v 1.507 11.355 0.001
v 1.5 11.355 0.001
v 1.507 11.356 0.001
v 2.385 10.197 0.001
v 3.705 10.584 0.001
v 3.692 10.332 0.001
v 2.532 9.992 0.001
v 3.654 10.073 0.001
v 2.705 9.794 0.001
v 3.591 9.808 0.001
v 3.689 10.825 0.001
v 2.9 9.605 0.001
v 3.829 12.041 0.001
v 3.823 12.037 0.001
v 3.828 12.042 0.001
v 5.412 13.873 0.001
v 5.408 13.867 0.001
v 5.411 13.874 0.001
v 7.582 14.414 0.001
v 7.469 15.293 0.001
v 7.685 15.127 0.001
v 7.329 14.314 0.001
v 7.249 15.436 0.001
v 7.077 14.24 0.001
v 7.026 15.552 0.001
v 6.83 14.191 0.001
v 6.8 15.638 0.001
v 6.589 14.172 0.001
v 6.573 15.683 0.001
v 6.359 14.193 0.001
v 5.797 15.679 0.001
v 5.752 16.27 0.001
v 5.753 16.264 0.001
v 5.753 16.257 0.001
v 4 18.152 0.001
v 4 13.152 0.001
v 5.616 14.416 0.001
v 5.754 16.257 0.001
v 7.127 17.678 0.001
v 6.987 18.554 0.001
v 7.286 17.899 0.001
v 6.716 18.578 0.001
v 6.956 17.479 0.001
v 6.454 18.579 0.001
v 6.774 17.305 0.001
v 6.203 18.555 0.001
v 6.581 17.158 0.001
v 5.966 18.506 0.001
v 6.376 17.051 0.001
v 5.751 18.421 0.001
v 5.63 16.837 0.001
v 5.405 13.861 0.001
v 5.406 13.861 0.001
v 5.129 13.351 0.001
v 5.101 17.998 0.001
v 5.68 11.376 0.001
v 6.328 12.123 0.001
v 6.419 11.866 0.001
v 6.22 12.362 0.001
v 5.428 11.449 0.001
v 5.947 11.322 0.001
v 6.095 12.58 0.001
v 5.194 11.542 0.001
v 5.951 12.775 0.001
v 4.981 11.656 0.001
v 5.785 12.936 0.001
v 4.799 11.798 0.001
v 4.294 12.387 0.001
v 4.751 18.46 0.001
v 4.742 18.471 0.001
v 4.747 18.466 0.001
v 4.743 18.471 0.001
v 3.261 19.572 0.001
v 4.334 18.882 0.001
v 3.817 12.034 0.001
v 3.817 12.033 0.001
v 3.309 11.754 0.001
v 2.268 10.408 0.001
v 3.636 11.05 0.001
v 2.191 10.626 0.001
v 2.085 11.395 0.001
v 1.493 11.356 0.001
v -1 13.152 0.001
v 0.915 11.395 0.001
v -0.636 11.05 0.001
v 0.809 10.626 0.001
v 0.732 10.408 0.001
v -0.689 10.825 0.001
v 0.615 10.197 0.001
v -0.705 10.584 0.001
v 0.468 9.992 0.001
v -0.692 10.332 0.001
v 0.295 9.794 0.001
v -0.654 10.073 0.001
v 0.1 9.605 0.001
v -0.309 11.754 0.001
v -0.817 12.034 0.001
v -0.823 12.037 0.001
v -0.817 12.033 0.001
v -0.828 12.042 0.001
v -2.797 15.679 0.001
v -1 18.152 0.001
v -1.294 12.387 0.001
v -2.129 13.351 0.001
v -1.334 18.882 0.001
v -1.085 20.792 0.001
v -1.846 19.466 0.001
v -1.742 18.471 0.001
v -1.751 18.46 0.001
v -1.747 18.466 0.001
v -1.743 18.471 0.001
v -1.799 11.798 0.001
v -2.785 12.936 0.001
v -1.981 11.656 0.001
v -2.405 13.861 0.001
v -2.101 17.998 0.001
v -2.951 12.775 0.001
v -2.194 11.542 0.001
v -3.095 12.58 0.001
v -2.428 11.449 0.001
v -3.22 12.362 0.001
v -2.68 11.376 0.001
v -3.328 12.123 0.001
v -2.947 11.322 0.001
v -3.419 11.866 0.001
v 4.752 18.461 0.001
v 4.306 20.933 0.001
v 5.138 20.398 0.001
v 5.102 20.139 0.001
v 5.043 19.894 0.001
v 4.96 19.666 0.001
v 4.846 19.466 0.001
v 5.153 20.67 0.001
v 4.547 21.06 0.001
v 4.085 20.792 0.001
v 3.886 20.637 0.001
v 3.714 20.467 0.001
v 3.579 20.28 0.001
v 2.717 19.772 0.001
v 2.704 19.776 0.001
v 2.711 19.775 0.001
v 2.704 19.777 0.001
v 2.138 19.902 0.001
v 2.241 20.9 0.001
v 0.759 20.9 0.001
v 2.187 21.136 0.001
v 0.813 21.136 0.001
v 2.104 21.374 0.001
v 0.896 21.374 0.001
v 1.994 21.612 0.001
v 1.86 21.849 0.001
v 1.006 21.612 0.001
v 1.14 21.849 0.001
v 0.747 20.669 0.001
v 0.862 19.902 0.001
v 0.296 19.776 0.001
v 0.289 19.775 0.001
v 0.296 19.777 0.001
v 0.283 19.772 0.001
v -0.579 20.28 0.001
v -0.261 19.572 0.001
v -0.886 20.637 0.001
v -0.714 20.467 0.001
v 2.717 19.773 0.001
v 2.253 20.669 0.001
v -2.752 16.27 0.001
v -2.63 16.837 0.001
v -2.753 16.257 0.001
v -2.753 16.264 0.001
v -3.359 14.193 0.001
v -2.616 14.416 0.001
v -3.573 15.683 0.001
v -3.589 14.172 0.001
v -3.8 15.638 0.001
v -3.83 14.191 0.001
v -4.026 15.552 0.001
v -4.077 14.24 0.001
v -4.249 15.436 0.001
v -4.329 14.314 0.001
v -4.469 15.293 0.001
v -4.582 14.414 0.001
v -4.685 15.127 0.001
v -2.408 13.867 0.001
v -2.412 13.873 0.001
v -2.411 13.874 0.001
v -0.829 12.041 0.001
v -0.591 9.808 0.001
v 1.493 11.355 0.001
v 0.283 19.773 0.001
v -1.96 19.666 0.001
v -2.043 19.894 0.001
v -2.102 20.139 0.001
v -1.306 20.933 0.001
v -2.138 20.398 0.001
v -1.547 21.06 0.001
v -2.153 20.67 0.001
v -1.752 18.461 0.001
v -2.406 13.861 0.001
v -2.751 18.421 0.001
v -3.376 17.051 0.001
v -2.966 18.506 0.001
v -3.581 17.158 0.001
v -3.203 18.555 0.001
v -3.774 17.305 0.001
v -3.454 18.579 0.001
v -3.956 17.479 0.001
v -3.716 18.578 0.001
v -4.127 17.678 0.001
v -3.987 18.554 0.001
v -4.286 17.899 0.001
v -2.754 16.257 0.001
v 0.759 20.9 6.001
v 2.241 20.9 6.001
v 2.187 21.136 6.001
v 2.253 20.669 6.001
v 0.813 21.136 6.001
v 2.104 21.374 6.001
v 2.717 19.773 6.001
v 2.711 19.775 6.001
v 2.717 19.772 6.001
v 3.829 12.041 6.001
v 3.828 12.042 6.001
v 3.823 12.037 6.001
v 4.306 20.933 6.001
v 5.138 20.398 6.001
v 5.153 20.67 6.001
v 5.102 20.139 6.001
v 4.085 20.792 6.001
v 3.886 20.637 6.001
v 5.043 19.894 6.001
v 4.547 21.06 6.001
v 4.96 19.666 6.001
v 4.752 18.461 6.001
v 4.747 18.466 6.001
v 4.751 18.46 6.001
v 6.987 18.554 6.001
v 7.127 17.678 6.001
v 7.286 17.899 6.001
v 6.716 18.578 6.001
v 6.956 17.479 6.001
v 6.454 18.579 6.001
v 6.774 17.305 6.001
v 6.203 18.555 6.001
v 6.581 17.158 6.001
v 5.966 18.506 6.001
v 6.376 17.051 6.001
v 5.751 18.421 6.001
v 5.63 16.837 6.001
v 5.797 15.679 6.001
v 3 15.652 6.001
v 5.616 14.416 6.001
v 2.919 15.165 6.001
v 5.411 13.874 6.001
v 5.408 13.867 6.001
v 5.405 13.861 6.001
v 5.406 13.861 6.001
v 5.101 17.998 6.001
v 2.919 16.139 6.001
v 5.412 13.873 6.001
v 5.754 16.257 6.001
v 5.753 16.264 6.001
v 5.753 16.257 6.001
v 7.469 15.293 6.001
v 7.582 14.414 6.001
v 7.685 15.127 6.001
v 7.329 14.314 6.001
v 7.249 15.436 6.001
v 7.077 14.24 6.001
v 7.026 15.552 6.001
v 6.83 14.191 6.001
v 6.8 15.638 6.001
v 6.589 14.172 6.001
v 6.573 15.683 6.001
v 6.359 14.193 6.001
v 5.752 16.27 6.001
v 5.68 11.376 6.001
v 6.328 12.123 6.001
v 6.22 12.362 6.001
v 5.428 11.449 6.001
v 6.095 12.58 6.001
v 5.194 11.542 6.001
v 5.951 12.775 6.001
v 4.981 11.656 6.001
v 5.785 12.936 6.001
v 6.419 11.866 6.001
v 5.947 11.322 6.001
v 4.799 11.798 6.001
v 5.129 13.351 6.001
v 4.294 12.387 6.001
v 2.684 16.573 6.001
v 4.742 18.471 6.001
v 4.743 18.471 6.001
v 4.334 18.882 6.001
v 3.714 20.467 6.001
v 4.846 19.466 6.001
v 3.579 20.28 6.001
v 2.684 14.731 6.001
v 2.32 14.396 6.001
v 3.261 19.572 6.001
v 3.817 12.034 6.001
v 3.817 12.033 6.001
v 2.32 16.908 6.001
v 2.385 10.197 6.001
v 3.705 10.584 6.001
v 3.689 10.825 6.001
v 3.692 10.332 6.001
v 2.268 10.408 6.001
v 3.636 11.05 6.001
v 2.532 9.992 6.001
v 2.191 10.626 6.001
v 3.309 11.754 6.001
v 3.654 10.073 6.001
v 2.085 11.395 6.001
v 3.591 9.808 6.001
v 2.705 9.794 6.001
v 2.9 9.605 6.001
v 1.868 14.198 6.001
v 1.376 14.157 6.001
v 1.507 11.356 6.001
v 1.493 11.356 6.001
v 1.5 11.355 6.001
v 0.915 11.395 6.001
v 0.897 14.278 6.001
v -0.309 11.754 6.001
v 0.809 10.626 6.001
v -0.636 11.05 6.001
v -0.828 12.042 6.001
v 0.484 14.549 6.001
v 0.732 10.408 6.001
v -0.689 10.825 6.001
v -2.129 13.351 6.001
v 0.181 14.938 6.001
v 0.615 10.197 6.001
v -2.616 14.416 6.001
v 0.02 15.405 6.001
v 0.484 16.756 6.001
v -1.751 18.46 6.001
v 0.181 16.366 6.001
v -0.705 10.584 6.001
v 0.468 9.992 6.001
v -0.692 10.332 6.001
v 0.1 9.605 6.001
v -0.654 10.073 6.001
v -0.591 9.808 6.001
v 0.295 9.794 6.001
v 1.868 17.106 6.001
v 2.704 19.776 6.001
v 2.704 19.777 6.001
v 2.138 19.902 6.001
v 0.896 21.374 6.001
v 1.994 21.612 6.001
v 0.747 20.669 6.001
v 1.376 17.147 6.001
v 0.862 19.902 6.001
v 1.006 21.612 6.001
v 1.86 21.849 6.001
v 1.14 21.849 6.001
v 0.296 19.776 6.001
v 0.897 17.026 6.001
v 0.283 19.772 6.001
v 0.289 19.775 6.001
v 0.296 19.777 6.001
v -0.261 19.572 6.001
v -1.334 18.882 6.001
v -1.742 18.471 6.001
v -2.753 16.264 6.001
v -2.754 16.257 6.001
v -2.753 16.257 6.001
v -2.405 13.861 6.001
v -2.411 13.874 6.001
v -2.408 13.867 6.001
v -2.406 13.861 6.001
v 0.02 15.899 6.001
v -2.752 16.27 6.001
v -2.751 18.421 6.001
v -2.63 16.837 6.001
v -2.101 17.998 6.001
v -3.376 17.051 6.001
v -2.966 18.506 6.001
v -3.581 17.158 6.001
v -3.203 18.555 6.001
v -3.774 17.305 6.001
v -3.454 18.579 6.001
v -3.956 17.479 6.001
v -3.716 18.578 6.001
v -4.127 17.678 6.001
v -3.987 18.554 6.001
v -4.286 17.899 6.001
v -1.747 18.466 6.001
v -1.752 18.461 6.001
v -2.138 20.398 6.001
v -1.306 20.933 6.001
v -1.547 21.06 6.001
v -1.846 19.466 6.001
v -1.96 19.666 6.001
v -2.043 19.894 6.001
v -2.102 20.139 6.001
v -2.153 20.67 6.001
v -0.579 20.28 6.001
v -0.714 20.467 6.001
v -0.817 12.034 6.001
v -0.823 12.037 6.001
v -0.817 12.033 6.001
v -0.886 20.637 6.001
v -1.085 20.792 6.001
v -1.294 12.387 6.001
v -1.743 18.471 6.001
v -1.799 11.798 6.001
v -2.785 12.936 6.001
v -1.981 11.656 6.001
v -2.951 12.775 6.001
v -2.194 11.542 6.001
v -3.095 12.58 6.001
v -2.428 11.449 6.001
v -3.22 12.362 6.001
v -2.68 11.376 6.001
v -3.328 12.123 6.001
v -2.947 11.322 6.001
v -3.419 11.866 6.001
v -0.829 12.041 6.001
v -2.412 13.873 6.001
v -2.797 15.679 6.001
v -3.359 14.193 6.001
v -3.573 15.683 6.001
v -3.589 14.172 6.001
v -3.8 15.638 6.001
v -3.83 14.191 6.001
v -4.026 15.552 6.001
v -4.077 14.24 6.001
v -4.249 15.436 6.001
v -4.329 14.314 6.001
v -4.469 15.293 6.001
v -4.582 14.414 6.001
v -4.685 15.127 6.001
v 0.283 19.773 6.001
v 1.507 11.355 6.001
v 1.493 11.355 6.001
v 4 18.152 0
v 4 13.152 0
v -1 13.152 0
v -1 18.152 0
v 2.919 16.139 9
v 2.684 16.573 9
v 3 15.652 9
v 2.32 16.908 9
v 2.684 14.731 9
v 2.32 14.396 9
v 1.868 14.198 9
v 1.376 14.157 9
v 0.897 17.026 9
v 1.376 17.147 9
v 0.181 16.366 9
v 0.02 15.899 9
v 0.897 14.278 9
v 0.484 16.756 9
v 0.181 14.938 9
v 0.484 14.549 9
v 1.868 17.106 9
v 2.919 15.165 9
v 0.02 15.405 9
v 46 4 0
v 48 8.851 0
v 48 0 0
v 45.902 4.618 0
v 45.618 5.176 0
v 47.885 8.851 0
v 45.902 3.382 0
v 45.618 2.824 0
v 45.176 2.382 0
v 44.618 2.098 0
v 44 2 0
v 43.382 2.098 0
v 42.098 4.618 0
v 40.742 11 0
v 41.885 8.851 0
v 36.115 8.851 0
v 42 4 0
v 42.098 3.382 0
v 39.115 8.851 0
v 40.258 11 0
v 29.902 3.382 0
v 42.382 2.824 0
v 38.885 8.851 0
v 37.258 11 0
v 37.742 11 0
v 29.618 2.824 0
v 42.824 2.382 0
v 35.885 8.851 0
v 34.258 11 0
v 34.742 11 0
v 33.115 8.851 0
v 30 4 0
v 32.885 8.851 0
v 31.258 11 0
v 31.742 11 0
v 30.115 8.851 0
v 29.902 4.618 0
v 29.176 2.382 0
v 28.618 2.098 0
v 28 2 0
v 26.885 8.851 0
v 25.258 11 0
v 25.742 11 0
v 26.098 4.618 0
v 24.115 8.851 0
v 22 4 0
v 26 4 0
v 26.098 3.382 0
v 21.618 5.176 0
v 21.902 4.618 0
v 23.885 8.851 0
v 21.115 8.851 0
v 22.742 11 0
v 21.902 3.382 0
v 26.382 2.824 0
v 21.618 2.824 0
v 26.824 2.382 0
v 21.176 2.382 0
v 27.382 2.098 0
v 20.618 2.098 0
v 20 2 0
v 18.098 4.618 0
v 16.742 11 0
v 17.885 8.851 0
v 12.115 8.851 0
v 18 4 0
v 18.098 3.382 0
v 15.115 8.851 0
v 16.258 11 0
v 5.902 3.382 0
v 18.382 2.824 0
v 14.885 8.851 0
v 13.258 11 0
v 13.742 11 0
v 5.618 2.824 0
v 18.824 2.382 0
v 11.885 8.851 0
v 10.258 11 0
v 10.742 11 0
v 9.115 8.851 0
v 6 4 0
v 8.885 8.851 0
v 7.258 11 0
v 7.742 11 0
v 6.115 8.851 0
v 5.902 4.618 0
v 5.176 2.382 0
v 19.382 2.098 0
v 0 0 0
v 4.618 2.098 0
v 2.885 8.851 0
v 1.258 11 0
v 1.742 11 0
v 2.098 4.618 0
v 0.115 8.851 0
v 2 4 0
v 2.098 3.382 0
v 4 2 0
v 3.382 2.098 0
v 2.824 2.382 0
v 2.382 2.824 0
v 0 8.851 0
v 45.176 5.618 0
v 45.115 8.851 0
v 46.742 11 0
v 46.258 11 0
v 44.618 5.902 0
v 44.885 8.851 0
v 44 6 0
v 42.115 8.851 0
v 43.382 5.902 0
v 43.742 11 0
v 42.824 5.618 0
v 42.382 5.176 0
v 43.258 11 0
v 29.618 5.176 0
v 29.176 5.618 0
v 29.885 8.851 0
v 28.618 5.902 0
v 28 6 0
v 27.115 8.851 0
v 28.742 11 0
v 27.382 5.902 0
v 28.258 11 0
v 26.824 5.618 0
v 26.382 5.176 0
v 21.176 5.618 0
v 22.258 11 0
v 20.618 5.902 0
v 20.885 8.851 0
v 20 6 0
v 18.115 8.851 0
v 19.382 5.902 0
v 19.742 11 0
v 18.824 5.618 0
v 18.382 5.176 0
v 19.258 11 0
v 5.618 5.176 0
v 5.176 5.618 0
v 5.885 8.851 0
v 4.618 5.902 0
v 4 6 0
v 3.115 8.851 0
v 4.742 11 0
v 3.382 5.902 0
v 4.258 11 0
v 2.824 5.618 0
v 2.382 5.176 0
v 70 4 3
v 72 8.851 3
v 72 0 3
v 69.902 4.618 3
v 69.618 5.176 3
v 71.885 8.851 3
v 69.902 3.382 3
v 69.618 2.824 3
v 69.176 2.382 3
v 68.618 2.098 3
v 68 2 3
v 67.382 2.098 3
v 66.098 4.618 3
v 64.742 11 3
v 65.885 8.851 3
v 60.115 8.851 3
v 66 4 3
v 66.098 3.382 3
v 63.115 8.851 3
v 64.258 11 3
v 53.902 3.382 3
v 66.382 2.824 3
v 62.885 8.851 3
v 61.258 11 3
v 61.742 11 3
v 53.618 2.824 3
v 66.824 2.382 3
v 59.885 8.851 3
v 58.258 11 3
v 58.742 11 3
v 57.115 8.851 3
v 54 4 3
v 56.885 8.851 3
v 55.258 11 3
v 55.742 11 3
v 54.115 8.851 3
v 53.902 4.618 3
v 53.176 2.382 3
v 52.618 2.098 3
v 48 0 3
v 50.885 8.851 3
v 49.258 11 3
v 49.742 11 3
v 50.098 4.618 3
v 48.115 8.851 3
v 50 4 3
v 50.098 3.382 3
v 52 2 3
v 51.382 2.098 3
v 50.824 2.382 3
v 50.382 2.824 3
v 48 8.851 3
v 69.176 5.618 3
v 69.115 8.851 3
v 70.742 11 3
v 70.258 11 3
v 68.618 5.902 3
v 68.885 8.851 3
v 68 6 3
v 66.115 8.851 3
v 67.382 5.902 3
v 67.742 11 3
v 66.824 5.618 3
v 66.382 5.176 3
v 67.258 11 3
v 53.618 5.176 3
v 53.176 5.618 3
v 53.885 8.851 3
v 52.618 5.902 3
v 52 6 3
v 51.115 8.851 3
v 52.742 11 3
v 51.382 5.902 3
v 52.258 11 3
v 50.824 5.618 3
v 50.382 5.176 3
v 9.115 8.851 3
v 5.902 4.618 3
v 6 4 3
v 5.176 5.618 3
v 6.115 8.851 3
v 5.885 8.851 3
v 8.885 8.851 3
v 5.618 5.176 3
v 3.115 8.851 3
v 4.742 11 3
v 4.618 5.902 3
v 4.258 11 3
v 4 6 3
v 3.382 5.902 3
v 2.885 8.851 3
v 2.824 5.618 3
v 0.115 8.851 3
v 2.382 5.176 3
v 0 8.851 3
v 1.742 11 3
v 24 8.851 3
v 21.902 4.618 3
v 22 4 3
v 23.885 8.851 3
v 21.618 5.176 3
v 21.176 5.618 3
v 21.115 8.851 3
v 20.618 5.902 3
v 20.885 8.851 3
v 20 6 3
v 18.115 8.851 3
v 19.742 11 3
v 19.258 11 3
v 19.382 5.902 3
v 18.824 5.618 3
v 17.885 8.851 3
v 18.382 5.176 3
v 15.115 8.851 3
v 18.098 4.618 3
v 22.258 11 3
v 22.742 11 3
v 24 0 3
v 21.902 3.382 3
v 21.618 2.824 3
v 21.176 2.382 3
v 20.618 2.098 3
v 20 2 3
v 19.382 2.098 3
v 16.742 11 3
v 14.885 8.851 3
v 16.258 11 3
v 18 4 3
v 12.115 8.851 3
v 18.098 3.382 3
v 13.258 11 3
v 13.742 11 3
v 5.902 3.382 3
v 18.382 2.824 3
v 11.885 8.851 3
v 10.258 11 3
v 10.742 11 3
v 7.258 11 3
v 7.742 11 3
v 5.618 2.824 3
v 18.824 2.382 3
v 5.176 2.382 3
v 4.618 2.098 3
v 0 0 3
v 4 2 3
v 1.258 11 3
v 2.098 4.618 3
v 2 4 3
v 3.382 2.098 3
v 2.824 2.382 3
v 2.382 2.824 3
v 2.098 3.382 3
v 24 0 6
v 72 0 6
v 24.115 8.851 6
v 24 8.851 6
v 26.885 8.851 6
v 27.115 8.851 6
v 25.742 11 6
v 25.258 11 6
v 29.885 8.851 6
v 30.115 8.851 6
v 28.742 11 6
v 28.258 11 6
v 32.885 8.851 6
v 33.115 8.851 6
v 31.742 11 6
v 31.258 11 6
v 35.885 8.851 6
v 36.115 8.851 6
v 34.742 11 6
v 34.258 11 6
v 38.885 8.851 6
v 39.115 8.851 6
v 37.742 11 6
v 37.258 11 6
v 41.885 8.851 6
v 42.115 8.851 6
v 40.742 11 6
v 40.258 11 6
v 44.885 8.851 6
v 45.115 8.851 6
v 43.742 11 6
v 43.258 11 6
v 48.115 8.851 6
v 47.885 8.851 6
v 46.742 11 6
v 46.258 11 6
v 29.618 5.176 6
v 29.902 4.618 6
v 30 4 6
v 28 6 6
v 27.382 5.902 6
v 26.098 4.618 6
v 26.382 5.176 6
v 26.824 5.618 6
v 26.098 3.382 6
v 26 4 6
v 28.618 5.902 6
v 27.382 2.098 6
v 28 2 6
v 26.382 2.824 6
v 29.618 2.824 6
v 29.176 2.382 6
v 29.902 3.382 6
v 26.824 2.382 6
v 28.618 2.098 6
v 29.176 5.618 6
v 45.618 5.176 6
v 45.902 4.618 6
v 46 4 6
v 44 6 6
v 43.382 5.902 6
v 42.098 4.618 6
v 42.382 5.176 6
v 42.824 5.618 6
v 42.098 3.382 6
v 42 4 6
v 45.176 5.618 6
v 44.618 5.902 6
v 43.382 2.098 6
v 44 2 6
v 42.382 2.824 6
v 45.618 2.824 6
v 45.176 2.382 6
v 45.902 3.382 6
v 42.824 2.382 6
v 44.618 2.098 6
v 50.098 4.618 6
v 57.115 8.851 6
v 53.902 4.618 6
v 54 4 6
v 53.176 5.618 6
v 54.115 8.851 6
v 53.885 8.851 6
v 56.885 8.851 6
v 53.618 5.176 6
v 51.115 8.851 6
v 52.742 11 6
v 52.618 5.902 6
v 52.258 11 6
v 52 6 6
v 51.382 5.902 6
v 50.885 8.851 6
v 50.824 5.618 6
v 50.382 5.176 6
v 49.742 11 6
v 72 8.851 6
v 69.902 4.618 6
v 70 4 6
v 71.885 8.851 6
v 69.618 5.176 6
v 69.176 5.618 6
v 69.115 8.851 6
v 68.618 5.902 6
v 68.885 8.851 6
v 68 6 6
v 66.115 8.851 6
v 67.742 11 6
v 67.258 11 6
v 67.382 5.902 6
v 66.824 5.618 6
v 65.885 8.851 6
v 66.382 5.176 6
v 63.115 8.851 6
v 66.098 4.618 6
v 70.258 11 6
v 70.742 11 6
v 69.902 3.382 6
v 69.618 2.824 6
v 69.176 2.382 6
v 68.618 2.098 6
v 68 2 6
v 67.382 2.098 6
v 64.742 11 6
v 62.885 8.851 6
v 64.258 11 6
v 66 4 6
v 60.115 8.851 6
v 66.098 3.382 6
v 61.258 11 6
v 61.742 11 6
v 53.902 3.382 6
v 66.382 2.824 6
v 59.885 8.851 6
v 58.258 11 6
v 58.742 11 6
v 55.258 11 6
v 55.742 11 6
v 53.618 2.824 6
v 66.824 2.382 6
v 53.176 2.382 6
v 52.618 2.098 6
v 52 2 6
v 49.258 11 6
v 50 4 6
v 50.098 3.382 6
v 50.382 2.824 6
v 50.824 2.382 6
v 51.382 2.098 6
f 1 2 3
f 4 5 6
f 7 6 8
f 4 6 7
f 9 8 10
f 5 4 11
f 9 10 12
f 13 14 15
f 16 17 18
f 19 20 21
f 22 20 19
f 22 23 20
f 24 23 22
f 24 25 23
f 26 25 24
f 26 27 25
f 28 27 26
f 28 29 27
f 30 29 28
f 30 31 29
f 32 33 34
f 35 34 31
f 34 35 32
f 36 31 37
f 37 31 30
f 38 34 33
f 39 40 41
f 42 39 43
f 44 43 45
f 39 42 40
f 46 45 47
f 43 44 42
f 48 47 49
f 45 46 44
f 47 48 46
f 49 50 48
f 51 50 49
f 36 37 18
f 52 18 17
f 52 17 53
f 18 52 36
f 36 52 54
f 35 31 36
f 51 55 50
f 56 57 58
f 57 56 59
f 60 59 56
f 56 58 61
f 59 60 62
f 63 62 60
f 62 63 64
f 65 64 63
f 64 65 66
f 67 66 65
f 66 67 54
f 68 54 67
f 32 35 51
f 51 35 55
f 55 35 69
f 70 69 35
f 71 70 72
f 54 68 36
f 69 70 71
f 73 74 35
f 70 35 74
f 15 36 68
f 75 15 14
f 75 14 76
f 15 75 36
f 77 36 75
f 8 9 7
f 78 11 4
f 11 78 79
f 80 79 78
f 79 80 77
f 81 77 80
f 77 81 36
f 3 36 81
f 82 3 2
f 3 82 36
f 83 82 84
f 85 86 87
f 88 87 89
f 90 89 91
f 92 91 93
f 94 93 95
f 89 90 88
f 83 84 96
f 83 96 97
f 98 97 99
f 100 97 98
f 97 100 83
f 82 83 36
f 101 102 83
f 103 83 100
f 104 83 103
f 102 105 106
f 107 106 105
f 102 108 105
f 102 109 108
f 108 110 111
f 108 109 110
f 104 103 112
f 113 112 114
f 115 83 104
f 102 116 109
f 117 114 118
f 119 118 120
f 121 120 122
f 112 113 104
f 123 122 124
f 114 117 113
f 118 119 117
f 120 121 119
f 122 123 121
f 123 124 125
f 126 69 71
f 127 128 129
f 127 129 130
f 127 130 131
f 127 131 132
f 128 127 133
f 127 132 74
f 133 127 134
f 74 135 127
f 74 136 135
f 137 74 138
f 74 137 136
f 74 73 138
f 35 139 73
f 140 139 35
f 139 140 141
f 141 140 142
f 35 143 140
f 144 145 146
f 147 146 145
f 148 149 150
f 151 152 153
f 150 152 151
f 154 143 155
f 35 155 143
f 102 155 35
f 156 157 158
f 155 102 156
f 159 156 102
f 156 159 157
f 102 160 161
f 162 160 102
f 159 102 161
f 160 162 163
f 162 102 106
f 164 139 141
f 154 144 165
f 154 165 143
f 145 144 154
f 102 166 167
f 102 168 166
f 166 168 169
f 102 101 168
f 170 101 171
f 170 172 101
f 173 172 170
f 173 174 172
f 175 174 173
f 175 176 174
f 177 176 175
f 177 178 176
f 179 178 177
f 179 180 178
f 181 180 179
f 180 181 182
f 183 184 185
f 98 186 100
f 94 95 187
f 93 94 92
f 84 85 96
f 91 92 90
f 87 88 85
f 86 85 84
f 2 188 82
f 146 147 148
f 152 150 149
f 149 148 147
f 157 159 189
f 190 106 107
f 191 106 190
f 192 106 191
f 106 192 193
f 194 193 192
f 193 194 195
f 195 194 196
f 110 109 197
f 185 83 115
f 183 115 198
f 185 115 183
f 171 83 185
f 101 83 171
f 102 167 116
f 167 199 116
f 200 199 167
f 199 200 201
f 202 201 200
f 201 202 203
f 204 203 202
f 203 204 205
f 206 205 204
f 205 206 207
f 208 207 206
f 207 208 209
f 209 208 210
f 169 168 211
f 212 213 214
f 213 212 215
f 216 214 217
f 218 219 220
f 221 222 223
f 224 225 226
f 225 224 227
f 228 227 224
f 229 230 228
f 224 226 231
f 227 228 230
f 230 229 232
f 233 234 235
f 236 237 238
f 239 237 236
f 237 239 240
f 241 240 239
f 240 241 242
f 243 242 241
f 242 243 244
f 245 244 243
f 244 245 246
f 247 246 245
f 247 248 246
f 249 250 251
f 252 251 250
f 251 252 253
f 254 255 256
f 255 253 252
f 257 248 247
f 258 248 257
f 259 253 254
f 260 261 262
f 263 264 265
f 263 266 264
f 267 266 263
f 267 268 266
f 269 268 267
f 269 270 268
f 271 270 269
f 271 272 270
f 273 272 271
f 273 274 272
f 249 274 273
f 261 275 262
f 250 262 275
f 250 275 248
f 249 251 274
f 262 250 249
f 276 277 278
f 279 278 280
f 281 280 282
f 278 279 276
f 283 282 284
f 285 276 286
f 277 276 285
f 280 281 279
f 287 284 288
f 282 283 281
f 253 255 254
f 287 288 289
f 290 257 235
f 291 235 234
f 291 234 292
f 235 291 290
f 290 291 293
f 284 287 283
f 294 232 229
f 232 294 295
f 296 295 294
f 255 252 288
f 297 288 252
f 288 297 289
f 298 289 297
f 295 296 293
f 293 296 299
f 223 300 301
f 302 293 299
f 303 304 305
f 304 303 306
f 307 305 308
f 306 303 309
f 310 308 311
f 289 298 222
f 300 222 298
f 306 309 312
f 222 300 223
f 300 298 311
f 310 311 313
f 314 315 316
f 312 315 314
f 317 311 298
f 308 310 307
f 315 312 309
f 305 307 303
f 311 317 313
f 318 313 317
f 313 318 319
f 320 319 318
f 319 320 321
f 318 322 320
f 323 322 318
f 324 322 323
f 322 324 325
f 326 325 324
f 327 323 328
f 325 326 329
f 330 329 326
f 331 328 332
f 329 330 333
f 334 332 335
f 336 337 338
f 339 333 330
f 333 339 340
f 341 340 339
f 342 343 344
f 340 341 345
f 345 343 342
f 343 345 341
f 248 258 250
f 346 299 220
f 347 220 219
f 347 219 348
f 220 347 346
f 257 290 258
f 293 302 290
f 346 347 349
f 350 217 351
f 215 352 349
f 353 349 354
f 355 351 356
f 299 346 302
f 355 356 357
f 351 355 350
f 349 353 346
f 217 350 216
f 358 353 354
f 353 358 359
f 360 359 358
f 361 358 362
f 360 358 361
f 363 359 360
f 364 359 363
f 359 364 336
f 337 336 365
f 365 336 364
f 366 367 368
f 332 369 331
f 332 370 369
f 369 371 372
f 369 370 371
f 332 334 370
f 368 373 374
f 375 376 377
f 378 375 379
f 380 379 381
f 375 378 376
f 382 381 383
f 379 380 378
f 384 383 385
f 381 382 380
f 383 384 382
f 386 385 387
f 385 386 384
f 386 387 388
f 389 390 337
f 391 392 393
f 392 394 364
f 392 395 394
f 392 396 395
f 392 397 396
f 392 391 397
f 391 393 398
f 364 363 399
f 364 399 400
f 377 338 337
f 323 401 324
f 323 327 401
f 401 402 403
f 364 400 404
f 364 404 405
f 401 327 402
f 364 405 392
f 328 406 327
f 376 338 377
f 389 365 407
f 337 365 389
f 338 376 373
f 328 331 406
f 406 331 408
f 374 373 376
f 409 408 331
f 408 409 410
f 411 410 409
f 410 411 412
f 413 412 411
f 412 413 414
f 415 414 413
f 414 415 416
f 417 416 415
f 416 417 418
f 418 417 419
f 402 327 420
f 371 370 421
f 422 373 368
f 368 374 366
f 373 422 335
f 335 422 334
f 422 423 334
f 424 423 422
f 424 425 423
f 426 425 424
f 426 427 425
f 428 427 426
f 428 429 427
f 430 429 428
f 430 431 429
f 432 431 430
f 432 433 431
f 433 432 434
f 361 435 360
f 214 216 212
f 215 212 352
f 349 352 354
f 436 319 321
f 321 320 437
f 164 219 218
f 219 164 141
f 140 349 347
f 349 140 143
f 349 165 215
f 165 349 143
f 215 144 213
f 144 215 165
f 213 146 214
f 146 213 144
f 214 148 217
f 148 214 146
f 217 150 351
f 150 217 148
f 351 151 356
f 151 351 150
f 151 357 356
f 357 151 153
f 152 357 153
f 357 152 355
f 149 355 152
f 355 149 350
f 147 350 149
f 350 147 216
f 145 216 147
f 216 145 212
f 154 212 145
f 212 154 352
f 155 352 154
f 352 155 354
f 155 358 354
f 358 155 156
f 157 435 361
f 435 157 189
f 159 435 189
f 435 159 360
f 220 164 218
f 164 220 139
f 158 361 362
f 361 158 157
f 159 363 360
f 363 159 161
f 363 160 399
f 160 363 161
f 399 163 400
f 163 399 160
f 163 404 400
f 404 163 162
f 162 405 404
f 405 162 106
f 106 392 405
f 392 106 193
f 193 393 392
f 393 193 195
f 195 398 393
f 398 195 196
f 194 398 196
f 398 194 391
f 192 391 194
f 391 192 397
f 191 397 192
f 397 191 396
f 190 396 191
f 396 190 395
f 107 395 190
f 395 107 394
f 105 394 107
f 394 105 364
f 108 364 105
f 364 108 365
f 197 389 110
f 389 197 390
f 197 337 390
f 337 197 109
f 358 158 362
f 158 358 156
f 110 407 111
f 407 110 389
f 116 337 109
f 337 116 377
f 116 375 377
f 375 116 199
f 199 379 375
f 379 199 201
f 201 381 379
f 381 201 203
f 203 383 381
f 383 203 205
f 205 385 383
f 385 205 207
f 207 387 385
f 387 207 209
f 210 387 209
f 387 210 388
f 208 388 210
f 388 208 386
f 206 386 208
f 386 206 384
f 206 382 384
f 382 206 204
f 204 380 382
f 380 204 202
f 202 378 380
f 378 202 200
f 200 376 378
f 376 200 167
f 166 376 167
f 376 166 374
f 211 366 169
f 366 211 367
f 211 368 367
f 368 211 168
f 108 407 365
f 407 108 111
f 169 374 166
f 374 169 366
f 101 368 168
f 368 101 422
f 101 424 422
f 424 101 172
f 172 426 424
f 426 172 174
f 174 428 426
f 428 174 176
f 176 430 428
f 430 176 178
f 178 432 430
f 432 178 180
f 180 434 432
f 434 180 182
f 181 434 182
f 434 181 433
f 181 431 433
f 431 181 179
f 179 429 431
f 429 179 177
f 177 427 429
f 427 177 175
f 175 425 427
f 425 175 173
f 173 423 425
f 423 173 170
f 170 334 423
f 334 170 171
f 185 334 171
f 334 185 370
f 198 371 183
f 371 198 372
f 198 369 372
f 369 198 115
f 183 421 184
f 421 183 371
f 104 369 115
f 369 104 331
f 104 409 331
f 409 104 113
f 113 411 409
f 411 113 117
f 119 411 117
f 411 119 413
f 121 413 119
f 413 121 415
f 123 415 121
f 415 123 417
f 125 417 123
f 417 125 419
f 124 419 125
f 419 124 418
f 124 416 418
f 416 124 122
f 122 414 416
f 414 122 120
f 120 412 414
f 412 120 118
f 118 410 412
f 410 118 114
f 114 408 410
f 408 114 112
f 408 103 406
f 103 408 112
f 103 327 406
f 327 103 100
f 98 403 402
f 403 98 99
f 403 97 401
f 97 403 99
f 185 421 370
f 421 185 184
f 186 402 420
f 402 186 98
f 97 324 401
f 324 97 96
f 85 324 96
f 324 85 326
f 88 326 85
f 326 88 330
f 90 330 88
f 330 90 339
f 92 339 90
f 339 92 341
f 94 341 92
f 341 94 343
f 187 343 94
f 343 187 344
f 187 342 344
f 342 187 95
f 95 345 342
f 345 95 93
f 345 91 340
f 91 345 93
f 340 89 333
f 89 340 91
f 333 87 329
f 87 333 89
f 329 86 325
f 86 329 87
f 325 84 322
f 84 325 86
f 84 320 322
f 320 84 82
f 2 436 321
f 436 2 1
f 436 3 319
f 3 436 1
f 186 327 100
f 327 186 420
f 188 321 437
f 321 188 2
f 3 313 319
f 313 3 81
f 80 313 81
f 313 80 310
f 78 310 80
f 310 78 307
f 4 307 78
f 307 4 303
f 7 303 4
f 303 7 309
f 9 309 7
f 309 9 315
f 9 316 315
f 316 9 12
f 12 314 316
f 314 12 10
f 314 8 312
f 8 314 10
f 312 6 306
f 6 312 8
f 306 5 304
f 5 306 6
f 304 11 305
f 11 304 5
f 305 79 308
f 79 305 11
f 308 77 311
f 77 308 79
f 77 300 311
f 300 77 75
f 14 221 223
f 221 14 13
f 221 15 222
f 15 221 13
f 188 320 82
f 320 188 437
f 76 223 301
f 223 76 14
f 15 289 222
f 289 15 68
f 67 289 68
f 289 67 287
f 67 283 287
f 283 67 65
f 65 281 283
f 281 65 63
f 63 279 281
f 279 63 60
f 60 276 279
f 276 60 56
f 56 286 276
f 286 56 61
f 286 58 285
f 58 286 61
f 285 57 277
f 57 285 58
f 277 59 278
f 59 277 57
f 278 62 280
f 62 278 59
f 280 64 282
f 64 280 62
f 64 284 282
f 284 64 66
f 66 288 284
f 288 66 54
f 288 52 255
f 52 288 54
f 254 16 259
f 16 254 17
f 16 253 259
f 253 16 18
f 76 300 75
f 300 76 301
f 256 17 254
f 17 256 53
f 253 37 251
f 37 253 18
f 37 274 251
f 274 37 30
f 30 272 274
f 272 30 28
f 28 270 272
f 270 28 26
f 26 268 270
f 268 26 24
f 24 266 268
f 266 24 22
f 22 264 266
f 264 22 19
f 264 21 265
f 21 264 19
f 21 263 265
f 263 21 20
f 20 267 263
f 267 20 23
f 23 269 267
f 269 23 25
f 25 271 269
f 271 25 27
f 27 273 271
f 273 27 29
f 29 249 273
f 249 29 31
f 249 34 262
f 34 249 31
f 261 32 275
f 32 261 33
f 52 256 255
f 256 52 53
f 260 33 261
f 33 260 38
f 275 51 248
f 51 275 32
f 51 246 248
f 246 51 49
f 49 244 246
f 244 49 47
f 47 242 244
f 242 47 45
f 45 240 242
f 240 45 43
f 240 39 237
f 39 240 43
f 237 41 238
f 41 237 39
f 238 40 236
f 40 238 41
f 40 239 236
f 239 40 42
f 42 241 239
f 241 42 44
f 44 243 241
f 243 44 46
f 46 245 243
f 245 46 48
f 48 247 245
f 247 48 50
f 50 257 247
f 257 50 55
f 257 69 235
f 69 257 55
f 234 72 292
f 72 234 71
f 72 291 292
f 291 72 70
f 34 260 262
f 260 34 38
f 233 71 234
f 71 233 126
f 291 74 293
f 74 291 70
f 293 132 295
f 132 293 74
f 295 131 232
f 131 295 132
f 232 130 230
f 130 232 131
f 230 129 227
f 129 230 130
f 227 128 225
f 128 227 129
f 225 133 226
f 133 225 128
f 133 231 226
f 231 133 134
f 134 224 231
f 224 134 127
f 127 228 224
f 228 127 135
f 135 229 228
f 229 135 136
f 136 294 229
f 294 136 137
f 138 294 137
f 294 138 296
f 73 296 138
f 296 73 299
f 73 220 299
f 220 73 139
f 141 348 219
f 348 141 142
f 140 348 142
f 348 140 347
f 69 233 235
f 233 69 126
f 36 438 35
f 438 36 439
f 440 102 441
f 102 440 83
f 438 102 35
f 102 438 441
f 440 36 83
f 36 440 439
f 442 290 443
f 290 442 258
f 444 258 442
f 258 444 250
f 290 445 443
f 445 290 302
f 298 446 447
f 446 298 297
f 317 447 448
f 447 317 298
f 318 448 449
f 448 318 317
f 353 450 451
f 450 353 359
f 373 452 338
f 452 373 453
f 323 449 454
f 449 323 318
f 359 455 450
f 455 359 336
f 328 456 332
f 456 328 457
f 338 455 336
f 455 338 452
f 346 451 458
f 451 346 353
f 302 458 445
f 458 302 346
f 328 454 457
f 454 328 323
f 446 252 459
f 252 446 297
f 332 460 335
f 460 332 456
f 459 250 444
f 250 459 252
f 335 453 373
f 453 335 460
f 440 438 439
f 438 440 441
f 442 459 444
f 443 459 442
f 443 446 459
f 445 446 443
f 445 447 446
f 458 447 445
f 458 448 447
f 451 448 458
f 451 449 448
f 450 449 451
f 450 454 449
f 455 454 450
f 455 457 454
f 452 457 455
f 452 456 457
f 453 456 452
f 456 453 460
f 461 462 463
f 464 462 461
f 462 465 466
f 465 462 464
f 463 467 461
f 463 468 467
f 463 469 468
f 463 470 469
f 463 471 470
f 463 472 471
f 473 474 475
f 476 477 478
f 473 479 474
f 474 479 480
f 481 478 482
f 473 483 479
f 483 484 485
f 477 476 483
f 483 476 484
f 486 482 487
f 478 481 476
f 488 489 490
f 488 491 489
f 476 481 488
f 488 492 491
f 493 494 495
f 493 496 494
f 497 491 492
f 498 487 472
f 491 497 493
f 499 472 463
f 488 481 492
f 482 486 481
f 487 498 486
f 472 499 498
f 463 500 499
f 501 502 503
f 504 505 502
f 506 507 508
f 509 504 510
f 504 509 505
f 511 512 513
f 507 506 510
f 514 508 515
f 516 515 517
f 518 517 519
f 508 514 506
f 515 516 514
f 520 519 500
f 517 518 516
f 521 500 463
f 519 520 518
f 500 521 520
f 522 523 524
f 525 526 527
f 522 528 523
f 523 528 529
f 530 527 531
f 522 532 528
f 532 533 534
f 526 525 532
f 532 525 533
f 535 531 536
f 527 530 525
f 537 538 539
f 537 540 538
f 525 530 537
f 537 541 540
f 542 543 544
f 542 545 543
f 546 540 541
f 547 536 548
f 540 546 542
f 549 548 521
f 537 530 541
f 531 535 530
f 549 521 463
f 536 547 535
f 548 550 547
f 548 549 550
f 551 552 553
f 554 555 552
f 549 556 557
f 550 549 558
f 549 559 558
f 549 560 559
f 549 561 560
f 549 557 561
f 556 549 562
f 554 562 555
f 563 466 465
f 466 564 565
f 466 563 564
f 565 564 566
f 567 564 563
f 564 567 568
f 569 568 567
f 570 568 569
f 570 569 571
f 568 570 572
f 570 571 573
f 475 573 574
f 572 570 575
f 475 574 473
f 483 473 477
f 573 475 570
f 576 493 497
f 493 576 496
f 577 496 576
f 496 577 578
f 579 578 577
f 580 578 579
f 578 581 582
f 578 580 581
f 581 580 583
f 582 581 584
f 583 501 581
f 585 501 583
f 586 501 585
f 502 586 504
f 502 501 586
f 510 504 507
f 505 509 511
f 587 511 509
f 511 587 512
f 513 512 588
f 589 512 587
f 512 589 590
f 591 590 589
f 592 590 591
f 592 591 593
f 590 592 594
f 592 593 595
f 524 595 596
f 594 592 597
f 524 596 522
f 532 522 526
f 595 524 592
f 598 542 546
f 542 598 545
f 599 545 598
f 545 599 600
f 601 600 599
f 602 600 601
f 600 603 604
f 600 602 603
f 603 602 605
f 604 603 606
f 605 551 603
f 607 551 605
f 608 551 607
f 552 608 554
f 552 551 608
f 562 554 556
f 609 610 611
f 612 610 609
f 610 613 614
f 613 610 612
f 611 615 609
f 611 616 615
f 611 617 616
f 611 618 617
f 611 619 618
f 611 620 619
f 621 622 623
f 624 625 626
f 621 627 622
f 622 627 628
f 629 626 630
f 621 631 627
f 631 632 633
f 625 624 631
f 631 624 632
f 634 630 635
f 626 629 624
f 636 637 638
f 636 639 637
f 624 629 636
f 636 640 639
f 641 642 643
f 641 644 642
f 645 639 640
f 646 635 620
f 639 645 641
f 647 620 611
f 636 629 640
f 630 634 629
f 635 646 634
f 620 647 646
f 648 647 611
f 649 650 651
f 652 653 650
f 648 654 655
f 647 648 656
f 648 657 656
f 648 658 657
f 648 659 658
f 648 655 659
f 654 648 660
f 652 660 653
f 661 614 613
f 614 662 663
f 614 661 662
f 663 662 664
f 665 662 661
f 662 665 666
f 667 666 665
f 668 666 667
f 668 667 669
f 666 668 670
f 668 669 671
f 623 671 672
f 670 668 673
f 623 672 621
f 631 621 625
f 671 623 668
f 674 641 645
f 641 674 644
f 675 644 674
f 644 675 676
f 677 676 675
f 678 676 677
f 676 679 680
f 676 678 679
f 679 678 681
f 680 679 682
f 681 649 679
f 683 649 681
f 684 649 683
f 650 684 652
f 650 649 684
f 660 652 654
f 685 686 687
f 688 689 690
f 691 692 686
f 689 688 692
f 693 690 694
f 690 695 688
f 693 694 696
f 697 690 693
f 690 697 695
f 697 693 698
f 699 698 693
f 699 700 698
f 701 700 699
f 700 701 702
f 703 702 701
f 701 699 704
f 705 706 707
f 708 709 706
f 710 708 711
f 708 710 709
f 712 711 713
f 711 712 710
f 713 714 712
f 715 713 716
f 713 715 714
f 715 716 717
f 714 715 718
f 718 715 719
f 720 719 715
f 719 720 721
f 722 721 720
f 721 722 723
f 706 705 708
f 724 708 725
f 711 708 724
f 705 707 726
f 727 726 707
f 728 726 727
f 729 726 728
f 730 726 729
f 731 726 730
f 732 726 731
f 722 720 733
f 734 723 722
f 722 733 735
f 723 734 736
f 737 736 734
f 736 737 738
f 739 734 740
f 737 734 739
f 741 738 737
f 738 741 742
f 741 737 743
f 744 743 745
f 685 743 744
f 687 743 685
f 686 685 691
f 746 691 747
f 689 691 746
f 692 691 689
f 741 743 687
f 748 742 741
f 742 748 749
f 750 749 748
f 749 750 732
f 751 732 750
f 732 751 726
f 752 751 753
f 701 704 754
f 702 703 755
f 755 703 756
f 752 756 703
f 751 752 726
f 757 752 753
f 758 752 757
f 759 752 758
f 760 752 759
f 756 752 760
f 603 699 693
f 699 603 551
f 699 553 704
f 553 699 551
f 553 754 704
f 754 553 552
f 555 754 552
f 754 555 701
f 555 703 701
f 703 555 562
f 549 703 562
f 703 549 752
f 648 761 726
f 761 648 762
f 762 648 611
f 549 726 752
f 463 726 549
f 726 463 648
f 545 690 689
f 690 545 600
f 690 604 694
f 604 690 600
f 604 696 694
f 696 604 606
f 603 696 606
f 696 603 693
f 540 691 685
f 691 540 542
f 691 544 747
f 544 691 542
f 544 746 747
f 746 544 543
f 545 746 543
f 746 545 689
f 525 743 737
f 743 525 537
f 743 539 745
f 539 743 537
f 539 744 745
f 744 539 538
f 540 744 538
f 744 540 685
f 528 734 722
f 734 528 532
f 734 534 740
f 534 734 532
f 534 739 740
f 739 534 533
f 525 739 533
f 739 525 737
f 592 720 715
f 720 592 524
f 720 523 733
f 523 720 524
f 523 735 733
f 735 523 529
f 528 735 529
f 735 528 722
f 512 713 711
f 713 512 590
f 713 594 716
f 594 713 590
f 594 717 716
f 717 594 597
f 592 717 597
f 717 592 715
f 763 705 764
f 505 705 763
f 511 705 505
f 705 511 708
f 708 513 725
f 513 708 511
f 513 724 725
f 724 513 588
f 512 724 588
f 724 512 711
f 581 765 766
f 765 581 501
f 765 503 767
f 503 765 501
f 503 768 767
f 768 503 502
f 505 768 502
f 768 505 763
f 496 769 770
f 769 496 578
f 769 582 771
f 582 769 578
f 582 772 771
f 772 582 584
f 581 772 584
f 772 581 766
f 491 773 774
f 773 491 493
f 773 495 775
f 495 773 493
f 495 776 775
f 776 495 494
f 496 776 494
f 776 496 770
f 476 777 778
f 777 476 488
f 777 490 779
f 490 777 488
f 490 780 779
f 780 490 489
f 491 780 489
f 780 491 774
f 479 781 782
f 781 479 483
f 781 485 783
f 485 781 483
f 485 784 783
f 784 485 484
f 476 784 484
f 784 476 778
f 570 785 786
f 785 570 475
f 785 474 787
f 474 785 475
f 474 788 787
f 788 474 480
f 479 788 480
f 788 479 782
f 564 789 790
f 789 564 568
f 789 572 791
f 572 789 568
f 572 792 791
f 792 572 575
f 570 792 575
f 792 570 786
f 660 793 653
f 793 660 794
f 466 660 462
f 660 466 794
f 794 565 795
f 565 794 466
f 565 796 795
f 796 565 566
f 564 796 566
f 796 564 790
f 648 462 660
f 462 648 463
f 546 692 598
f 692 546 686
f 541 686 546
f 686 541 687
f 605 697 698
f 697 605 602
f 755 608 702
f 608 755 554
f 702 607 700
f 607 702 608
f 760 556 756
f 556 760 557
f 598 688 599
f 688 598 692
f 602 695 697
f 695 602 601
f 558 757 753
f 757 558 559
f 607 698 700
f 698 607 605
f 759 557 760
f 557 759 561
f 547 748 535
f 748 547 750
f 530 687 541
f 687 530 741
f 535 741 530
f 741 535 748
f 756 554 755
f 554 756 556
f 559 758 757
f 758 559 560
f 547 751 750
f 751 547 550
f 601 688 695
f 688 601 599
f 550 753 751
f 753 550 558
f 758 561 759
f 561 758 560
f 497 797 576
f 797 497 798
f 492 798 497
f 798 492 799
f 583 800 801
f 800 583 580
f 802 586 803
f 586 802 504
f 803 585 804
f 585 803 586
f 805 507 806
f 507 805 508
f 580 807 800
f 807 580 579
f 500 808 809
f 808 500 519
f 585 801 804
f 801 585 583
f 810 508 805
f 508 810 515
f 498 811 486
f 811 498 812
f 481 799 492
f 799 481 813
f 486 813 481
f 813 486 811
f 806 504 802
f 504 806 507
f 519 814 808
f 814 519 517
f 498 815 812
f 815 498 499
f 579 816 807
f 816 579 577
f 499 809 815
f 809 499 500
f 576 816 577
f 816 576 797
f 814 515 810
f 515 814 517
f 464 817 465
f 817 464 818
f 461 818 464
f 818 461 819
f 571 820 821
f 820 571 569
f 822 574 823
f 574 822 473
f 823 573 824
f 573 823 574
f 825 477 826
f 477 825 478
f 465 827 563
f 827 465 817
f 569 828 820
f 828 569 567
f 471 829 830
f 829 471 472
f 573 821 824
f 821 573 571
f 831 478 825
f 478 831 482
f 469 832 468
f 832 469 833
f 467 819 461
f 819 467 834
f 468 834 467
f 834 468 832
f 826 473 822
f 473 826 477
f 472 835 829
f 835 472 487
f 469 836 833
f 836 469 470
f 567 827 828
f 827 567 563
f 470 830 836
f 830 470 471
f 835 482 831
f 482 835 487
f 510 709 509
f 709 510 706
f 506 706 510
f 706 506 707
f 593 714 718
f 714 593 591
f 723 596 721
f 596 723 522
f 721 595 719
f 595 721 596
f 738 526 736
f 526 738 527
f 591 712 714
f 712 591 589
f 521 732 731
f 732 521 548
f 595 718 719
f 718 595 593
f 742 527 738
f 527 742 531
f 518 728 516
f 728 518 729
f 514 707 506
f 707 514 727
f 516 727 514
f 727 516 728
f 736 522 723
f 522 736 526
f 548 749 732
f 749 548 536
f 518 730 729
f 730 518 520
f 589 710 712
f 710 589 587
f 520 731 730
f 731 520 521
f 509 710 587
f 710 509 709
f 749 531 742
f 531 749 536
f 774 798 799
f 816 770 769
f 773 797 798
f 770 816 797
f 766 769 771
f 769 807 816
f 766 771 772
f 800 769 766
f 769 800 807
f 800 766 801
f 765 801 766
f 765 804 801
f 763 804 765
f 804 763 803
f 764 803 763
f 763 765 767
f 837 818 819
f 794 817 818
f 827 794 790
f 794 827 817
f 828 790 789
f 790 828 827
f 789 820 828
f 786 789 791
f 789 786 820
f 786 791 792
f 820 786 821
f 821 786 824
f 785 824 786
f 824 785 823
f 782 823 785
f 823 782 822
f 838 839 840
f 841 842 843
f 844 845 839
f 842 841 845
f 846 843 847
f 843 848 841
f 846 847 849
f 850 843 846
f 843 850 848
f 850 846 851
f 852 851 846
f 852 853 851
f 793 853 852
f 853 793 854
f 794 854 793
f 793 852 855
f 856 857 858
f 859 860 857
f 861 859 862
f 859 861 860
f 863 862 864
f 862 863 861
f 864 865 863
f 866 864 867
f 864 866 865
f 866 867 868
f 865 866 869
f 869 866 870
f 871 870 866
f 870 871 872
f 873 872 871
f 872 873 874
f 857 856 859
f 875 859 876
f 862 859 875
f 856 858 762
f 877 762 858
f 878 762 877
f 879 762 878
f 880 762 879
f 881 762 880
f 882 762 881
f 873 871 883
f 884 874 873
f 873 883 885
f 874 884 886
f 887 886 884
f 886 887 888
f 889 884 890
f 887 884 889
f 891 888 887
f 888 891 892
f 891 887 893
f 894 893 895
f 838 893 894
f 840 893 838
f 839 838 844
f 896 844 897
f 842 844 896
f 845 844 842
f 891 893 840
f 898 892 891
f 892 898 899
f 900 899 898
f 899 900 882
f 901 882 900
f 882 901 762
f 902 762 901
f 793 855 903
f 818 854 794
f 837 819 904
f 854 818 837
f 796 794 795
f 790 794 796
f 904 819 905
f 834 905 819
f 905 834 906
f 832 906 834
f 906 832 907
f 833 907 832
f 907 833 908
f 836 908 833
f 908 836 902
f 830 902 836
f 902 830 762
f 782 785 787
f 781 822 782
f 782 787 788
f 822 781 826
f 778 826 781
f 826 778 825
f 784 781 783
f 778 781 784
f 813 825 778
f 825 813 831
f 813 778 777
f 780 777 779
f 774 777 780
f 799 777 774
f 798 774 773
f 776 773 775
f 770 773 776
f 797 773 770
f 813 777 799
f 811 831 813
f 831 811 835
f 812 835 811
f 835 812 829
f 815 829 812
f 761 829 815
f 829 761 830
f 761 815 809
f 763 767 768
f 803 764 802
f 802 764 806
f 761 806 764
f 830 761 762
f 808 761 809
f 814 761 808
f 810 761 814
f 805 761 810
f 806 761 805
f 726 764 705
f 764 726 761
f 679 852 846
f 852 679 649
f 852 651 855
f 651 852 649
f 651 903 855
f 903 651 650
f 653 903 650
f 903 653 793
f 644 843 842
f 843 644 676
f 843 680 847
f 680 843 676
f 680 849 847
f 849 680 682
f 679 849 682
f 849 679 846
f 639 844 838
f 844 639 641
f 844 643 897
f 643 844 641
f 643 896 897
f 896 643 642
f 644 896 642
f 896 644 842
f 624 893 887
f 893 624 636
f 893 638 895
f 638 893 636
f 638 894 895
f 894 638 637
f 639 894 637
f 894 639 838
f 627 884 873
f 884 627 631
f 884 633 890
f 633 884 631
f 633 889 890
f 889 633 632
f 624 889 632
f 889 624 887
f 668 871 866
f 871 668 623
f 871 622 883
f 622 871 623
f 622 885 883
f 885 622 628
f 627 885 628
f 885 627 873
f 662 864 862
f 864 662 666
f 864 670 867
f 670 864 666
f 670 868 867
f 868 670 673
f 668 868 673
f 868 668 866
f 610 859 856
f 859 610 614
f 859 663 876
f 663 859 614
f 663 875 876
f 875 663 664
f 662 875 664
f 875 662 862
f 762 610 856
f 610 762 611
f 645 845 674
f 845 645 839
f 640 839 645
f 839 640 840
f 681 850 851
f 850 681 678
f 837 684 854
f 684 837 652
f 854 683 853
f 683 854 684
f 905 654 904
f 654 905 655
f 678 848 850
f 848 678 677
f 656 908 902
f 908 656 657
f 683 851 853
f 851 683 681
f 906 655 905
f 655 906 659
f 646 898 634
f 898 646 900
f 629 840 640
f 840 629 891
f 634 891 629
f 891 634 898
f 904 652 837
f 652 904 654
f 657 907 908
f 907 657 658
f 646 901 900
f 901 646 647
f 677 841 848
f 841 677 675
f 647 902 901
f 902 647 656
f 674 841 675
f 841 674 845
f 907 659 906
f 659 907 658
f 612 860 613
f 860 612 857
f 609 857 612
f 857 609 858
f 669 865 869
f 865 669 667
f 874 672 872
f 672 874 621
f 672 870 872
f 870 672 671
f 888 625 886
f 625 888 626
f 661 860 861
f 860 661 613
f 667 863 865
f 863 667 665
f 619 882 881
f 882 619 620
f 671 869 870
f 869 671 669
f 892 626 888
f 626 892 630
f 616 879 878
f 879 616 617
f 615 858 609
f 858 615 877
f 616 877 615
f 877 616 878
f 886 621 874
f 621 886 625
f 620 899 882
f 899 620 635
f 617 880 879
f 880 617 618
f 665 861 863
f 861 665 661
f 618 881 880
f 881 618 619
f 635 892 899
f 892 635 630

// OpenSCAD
// https://www.thingiverse.com/thing:1645390/#files
use <Rack_and_pinion_v1.1_-with_backboard_endstops_flanges.scad>;

// fs: minimum size of a side, mm
$fs = 0.5;
// maximum number of sides per circle = 360/$fa
// 20 = 360/fa
// 20 * fa = 360
// fa = 360/20
$fa = 360/20;

material_height = 3;

mm_per_tooth = 3;
pressure_angle = 15;

// The minimum distances between a bolt hole and the nearest edge.
bolt_hole_margin = 2;

rack_section_bolt_d = 4;
bolt_hole_with_margins = rack_section_bolt_d + 2 * bolt_hole_margin;

// This is a guess, plus an experimentally determined fudge factor ... an actual formula
// would probably be handy.
rack_tooth_height = mm_per_tooth - 0.6;

rack_thickness = rack_tooth_height + bolt_hole_with_margins;

gear_teeth = 20;

plastic_parts();
translate([mm_per_tooth/2, rack_thickness + pitch_radius(mm_per_tooth = mm_per_tooth), 0]) 
    color([0.5, 0.5, 0.5])
        magnet_and_pin();

module magnet_and_pin() {
    magnet();
    cylinder(d=3, h=3*material_height);
}

module plastic_parts() {
    translate([mm_per_tooth/2, rack_thickness + pitch_radius(mm_per_tooth = mm_per_tooth), 0]) {
        difference() {
            translate([0, 0, material_height+0.001])
                gear(mm_per_tooth = mm_per_tooth, thickness = material_height*2, hole_diameter=0, pressure_angle = pressure_angle);
            magnet_and_pin();
        }
    }
}


// To fit onto an A4 sheet, longwise, with healthy margin for misalignment.
//rack_width_appx = 295;
// For easy visualization / demo.
rack_width_appx=50;
rack_num_teeth = floor(rack_width_appx / mm_per_tooth);
rack_width = mm_per_tooth * rack_num_teeth;

rack_section();
translate([rack_width/2, 0, material_height])
    rack_section();

module magnet() {
    x=5;
    y=5;
    z=2;
    translate([-x/2, -y/2, 0])
  color([0.5, 0.5, 0.5])
   cube([x, y, z]);
}

module rack_section() {
    rack_tooth_height = mm_per_tooth;
    
    rack_thickness = rack_tooth_height + bolt_hole_with_margins;
    
    difference() {
        // Just because I prefer to have my object mostly in +z
        translate([0, 0, material_height/2])
            InvoluteGear_rack(thickness = material_height, height = rack_thickness, mm_per_tooth = mm_per_tooth, number_of_teeth=rack_num_teeth, backboard_thickness = 0, left_stop_enable=0, right_stop_enable=0);

	// One just in from the left.
	translate([bolt_hole_with_margins/2, bolt_hole_with_margins/2, -1])
            cylinder(d=rack_section_bolt_d, h = material_height+2);
 
	// One to mate with the one just in from the left on the next one.
	translate([bolt_hole_with_margins/2 + rack_width/2, bolt_hole_with_margins/2, -1])
            cylinder(d=rack_section_bolt_d, h = material_height+2);

	// One just in from the right.
	translate([rack_width - (bolt_hole_with_margins/2), bolt_hole_with_margins/2, -1])
            cylinder(d=rack_section_bolt_d, h = material_height+2);
 
	// One to mate with the one just in from the right on the previous one.
	translate([rack_width - (bolt_hole_with_margins/2 + rack_width/2), bolt_hole_with_margins/2, -1])
            cylinder(d=rack_section_bolt_d, h = material_height+2);

    }
}
